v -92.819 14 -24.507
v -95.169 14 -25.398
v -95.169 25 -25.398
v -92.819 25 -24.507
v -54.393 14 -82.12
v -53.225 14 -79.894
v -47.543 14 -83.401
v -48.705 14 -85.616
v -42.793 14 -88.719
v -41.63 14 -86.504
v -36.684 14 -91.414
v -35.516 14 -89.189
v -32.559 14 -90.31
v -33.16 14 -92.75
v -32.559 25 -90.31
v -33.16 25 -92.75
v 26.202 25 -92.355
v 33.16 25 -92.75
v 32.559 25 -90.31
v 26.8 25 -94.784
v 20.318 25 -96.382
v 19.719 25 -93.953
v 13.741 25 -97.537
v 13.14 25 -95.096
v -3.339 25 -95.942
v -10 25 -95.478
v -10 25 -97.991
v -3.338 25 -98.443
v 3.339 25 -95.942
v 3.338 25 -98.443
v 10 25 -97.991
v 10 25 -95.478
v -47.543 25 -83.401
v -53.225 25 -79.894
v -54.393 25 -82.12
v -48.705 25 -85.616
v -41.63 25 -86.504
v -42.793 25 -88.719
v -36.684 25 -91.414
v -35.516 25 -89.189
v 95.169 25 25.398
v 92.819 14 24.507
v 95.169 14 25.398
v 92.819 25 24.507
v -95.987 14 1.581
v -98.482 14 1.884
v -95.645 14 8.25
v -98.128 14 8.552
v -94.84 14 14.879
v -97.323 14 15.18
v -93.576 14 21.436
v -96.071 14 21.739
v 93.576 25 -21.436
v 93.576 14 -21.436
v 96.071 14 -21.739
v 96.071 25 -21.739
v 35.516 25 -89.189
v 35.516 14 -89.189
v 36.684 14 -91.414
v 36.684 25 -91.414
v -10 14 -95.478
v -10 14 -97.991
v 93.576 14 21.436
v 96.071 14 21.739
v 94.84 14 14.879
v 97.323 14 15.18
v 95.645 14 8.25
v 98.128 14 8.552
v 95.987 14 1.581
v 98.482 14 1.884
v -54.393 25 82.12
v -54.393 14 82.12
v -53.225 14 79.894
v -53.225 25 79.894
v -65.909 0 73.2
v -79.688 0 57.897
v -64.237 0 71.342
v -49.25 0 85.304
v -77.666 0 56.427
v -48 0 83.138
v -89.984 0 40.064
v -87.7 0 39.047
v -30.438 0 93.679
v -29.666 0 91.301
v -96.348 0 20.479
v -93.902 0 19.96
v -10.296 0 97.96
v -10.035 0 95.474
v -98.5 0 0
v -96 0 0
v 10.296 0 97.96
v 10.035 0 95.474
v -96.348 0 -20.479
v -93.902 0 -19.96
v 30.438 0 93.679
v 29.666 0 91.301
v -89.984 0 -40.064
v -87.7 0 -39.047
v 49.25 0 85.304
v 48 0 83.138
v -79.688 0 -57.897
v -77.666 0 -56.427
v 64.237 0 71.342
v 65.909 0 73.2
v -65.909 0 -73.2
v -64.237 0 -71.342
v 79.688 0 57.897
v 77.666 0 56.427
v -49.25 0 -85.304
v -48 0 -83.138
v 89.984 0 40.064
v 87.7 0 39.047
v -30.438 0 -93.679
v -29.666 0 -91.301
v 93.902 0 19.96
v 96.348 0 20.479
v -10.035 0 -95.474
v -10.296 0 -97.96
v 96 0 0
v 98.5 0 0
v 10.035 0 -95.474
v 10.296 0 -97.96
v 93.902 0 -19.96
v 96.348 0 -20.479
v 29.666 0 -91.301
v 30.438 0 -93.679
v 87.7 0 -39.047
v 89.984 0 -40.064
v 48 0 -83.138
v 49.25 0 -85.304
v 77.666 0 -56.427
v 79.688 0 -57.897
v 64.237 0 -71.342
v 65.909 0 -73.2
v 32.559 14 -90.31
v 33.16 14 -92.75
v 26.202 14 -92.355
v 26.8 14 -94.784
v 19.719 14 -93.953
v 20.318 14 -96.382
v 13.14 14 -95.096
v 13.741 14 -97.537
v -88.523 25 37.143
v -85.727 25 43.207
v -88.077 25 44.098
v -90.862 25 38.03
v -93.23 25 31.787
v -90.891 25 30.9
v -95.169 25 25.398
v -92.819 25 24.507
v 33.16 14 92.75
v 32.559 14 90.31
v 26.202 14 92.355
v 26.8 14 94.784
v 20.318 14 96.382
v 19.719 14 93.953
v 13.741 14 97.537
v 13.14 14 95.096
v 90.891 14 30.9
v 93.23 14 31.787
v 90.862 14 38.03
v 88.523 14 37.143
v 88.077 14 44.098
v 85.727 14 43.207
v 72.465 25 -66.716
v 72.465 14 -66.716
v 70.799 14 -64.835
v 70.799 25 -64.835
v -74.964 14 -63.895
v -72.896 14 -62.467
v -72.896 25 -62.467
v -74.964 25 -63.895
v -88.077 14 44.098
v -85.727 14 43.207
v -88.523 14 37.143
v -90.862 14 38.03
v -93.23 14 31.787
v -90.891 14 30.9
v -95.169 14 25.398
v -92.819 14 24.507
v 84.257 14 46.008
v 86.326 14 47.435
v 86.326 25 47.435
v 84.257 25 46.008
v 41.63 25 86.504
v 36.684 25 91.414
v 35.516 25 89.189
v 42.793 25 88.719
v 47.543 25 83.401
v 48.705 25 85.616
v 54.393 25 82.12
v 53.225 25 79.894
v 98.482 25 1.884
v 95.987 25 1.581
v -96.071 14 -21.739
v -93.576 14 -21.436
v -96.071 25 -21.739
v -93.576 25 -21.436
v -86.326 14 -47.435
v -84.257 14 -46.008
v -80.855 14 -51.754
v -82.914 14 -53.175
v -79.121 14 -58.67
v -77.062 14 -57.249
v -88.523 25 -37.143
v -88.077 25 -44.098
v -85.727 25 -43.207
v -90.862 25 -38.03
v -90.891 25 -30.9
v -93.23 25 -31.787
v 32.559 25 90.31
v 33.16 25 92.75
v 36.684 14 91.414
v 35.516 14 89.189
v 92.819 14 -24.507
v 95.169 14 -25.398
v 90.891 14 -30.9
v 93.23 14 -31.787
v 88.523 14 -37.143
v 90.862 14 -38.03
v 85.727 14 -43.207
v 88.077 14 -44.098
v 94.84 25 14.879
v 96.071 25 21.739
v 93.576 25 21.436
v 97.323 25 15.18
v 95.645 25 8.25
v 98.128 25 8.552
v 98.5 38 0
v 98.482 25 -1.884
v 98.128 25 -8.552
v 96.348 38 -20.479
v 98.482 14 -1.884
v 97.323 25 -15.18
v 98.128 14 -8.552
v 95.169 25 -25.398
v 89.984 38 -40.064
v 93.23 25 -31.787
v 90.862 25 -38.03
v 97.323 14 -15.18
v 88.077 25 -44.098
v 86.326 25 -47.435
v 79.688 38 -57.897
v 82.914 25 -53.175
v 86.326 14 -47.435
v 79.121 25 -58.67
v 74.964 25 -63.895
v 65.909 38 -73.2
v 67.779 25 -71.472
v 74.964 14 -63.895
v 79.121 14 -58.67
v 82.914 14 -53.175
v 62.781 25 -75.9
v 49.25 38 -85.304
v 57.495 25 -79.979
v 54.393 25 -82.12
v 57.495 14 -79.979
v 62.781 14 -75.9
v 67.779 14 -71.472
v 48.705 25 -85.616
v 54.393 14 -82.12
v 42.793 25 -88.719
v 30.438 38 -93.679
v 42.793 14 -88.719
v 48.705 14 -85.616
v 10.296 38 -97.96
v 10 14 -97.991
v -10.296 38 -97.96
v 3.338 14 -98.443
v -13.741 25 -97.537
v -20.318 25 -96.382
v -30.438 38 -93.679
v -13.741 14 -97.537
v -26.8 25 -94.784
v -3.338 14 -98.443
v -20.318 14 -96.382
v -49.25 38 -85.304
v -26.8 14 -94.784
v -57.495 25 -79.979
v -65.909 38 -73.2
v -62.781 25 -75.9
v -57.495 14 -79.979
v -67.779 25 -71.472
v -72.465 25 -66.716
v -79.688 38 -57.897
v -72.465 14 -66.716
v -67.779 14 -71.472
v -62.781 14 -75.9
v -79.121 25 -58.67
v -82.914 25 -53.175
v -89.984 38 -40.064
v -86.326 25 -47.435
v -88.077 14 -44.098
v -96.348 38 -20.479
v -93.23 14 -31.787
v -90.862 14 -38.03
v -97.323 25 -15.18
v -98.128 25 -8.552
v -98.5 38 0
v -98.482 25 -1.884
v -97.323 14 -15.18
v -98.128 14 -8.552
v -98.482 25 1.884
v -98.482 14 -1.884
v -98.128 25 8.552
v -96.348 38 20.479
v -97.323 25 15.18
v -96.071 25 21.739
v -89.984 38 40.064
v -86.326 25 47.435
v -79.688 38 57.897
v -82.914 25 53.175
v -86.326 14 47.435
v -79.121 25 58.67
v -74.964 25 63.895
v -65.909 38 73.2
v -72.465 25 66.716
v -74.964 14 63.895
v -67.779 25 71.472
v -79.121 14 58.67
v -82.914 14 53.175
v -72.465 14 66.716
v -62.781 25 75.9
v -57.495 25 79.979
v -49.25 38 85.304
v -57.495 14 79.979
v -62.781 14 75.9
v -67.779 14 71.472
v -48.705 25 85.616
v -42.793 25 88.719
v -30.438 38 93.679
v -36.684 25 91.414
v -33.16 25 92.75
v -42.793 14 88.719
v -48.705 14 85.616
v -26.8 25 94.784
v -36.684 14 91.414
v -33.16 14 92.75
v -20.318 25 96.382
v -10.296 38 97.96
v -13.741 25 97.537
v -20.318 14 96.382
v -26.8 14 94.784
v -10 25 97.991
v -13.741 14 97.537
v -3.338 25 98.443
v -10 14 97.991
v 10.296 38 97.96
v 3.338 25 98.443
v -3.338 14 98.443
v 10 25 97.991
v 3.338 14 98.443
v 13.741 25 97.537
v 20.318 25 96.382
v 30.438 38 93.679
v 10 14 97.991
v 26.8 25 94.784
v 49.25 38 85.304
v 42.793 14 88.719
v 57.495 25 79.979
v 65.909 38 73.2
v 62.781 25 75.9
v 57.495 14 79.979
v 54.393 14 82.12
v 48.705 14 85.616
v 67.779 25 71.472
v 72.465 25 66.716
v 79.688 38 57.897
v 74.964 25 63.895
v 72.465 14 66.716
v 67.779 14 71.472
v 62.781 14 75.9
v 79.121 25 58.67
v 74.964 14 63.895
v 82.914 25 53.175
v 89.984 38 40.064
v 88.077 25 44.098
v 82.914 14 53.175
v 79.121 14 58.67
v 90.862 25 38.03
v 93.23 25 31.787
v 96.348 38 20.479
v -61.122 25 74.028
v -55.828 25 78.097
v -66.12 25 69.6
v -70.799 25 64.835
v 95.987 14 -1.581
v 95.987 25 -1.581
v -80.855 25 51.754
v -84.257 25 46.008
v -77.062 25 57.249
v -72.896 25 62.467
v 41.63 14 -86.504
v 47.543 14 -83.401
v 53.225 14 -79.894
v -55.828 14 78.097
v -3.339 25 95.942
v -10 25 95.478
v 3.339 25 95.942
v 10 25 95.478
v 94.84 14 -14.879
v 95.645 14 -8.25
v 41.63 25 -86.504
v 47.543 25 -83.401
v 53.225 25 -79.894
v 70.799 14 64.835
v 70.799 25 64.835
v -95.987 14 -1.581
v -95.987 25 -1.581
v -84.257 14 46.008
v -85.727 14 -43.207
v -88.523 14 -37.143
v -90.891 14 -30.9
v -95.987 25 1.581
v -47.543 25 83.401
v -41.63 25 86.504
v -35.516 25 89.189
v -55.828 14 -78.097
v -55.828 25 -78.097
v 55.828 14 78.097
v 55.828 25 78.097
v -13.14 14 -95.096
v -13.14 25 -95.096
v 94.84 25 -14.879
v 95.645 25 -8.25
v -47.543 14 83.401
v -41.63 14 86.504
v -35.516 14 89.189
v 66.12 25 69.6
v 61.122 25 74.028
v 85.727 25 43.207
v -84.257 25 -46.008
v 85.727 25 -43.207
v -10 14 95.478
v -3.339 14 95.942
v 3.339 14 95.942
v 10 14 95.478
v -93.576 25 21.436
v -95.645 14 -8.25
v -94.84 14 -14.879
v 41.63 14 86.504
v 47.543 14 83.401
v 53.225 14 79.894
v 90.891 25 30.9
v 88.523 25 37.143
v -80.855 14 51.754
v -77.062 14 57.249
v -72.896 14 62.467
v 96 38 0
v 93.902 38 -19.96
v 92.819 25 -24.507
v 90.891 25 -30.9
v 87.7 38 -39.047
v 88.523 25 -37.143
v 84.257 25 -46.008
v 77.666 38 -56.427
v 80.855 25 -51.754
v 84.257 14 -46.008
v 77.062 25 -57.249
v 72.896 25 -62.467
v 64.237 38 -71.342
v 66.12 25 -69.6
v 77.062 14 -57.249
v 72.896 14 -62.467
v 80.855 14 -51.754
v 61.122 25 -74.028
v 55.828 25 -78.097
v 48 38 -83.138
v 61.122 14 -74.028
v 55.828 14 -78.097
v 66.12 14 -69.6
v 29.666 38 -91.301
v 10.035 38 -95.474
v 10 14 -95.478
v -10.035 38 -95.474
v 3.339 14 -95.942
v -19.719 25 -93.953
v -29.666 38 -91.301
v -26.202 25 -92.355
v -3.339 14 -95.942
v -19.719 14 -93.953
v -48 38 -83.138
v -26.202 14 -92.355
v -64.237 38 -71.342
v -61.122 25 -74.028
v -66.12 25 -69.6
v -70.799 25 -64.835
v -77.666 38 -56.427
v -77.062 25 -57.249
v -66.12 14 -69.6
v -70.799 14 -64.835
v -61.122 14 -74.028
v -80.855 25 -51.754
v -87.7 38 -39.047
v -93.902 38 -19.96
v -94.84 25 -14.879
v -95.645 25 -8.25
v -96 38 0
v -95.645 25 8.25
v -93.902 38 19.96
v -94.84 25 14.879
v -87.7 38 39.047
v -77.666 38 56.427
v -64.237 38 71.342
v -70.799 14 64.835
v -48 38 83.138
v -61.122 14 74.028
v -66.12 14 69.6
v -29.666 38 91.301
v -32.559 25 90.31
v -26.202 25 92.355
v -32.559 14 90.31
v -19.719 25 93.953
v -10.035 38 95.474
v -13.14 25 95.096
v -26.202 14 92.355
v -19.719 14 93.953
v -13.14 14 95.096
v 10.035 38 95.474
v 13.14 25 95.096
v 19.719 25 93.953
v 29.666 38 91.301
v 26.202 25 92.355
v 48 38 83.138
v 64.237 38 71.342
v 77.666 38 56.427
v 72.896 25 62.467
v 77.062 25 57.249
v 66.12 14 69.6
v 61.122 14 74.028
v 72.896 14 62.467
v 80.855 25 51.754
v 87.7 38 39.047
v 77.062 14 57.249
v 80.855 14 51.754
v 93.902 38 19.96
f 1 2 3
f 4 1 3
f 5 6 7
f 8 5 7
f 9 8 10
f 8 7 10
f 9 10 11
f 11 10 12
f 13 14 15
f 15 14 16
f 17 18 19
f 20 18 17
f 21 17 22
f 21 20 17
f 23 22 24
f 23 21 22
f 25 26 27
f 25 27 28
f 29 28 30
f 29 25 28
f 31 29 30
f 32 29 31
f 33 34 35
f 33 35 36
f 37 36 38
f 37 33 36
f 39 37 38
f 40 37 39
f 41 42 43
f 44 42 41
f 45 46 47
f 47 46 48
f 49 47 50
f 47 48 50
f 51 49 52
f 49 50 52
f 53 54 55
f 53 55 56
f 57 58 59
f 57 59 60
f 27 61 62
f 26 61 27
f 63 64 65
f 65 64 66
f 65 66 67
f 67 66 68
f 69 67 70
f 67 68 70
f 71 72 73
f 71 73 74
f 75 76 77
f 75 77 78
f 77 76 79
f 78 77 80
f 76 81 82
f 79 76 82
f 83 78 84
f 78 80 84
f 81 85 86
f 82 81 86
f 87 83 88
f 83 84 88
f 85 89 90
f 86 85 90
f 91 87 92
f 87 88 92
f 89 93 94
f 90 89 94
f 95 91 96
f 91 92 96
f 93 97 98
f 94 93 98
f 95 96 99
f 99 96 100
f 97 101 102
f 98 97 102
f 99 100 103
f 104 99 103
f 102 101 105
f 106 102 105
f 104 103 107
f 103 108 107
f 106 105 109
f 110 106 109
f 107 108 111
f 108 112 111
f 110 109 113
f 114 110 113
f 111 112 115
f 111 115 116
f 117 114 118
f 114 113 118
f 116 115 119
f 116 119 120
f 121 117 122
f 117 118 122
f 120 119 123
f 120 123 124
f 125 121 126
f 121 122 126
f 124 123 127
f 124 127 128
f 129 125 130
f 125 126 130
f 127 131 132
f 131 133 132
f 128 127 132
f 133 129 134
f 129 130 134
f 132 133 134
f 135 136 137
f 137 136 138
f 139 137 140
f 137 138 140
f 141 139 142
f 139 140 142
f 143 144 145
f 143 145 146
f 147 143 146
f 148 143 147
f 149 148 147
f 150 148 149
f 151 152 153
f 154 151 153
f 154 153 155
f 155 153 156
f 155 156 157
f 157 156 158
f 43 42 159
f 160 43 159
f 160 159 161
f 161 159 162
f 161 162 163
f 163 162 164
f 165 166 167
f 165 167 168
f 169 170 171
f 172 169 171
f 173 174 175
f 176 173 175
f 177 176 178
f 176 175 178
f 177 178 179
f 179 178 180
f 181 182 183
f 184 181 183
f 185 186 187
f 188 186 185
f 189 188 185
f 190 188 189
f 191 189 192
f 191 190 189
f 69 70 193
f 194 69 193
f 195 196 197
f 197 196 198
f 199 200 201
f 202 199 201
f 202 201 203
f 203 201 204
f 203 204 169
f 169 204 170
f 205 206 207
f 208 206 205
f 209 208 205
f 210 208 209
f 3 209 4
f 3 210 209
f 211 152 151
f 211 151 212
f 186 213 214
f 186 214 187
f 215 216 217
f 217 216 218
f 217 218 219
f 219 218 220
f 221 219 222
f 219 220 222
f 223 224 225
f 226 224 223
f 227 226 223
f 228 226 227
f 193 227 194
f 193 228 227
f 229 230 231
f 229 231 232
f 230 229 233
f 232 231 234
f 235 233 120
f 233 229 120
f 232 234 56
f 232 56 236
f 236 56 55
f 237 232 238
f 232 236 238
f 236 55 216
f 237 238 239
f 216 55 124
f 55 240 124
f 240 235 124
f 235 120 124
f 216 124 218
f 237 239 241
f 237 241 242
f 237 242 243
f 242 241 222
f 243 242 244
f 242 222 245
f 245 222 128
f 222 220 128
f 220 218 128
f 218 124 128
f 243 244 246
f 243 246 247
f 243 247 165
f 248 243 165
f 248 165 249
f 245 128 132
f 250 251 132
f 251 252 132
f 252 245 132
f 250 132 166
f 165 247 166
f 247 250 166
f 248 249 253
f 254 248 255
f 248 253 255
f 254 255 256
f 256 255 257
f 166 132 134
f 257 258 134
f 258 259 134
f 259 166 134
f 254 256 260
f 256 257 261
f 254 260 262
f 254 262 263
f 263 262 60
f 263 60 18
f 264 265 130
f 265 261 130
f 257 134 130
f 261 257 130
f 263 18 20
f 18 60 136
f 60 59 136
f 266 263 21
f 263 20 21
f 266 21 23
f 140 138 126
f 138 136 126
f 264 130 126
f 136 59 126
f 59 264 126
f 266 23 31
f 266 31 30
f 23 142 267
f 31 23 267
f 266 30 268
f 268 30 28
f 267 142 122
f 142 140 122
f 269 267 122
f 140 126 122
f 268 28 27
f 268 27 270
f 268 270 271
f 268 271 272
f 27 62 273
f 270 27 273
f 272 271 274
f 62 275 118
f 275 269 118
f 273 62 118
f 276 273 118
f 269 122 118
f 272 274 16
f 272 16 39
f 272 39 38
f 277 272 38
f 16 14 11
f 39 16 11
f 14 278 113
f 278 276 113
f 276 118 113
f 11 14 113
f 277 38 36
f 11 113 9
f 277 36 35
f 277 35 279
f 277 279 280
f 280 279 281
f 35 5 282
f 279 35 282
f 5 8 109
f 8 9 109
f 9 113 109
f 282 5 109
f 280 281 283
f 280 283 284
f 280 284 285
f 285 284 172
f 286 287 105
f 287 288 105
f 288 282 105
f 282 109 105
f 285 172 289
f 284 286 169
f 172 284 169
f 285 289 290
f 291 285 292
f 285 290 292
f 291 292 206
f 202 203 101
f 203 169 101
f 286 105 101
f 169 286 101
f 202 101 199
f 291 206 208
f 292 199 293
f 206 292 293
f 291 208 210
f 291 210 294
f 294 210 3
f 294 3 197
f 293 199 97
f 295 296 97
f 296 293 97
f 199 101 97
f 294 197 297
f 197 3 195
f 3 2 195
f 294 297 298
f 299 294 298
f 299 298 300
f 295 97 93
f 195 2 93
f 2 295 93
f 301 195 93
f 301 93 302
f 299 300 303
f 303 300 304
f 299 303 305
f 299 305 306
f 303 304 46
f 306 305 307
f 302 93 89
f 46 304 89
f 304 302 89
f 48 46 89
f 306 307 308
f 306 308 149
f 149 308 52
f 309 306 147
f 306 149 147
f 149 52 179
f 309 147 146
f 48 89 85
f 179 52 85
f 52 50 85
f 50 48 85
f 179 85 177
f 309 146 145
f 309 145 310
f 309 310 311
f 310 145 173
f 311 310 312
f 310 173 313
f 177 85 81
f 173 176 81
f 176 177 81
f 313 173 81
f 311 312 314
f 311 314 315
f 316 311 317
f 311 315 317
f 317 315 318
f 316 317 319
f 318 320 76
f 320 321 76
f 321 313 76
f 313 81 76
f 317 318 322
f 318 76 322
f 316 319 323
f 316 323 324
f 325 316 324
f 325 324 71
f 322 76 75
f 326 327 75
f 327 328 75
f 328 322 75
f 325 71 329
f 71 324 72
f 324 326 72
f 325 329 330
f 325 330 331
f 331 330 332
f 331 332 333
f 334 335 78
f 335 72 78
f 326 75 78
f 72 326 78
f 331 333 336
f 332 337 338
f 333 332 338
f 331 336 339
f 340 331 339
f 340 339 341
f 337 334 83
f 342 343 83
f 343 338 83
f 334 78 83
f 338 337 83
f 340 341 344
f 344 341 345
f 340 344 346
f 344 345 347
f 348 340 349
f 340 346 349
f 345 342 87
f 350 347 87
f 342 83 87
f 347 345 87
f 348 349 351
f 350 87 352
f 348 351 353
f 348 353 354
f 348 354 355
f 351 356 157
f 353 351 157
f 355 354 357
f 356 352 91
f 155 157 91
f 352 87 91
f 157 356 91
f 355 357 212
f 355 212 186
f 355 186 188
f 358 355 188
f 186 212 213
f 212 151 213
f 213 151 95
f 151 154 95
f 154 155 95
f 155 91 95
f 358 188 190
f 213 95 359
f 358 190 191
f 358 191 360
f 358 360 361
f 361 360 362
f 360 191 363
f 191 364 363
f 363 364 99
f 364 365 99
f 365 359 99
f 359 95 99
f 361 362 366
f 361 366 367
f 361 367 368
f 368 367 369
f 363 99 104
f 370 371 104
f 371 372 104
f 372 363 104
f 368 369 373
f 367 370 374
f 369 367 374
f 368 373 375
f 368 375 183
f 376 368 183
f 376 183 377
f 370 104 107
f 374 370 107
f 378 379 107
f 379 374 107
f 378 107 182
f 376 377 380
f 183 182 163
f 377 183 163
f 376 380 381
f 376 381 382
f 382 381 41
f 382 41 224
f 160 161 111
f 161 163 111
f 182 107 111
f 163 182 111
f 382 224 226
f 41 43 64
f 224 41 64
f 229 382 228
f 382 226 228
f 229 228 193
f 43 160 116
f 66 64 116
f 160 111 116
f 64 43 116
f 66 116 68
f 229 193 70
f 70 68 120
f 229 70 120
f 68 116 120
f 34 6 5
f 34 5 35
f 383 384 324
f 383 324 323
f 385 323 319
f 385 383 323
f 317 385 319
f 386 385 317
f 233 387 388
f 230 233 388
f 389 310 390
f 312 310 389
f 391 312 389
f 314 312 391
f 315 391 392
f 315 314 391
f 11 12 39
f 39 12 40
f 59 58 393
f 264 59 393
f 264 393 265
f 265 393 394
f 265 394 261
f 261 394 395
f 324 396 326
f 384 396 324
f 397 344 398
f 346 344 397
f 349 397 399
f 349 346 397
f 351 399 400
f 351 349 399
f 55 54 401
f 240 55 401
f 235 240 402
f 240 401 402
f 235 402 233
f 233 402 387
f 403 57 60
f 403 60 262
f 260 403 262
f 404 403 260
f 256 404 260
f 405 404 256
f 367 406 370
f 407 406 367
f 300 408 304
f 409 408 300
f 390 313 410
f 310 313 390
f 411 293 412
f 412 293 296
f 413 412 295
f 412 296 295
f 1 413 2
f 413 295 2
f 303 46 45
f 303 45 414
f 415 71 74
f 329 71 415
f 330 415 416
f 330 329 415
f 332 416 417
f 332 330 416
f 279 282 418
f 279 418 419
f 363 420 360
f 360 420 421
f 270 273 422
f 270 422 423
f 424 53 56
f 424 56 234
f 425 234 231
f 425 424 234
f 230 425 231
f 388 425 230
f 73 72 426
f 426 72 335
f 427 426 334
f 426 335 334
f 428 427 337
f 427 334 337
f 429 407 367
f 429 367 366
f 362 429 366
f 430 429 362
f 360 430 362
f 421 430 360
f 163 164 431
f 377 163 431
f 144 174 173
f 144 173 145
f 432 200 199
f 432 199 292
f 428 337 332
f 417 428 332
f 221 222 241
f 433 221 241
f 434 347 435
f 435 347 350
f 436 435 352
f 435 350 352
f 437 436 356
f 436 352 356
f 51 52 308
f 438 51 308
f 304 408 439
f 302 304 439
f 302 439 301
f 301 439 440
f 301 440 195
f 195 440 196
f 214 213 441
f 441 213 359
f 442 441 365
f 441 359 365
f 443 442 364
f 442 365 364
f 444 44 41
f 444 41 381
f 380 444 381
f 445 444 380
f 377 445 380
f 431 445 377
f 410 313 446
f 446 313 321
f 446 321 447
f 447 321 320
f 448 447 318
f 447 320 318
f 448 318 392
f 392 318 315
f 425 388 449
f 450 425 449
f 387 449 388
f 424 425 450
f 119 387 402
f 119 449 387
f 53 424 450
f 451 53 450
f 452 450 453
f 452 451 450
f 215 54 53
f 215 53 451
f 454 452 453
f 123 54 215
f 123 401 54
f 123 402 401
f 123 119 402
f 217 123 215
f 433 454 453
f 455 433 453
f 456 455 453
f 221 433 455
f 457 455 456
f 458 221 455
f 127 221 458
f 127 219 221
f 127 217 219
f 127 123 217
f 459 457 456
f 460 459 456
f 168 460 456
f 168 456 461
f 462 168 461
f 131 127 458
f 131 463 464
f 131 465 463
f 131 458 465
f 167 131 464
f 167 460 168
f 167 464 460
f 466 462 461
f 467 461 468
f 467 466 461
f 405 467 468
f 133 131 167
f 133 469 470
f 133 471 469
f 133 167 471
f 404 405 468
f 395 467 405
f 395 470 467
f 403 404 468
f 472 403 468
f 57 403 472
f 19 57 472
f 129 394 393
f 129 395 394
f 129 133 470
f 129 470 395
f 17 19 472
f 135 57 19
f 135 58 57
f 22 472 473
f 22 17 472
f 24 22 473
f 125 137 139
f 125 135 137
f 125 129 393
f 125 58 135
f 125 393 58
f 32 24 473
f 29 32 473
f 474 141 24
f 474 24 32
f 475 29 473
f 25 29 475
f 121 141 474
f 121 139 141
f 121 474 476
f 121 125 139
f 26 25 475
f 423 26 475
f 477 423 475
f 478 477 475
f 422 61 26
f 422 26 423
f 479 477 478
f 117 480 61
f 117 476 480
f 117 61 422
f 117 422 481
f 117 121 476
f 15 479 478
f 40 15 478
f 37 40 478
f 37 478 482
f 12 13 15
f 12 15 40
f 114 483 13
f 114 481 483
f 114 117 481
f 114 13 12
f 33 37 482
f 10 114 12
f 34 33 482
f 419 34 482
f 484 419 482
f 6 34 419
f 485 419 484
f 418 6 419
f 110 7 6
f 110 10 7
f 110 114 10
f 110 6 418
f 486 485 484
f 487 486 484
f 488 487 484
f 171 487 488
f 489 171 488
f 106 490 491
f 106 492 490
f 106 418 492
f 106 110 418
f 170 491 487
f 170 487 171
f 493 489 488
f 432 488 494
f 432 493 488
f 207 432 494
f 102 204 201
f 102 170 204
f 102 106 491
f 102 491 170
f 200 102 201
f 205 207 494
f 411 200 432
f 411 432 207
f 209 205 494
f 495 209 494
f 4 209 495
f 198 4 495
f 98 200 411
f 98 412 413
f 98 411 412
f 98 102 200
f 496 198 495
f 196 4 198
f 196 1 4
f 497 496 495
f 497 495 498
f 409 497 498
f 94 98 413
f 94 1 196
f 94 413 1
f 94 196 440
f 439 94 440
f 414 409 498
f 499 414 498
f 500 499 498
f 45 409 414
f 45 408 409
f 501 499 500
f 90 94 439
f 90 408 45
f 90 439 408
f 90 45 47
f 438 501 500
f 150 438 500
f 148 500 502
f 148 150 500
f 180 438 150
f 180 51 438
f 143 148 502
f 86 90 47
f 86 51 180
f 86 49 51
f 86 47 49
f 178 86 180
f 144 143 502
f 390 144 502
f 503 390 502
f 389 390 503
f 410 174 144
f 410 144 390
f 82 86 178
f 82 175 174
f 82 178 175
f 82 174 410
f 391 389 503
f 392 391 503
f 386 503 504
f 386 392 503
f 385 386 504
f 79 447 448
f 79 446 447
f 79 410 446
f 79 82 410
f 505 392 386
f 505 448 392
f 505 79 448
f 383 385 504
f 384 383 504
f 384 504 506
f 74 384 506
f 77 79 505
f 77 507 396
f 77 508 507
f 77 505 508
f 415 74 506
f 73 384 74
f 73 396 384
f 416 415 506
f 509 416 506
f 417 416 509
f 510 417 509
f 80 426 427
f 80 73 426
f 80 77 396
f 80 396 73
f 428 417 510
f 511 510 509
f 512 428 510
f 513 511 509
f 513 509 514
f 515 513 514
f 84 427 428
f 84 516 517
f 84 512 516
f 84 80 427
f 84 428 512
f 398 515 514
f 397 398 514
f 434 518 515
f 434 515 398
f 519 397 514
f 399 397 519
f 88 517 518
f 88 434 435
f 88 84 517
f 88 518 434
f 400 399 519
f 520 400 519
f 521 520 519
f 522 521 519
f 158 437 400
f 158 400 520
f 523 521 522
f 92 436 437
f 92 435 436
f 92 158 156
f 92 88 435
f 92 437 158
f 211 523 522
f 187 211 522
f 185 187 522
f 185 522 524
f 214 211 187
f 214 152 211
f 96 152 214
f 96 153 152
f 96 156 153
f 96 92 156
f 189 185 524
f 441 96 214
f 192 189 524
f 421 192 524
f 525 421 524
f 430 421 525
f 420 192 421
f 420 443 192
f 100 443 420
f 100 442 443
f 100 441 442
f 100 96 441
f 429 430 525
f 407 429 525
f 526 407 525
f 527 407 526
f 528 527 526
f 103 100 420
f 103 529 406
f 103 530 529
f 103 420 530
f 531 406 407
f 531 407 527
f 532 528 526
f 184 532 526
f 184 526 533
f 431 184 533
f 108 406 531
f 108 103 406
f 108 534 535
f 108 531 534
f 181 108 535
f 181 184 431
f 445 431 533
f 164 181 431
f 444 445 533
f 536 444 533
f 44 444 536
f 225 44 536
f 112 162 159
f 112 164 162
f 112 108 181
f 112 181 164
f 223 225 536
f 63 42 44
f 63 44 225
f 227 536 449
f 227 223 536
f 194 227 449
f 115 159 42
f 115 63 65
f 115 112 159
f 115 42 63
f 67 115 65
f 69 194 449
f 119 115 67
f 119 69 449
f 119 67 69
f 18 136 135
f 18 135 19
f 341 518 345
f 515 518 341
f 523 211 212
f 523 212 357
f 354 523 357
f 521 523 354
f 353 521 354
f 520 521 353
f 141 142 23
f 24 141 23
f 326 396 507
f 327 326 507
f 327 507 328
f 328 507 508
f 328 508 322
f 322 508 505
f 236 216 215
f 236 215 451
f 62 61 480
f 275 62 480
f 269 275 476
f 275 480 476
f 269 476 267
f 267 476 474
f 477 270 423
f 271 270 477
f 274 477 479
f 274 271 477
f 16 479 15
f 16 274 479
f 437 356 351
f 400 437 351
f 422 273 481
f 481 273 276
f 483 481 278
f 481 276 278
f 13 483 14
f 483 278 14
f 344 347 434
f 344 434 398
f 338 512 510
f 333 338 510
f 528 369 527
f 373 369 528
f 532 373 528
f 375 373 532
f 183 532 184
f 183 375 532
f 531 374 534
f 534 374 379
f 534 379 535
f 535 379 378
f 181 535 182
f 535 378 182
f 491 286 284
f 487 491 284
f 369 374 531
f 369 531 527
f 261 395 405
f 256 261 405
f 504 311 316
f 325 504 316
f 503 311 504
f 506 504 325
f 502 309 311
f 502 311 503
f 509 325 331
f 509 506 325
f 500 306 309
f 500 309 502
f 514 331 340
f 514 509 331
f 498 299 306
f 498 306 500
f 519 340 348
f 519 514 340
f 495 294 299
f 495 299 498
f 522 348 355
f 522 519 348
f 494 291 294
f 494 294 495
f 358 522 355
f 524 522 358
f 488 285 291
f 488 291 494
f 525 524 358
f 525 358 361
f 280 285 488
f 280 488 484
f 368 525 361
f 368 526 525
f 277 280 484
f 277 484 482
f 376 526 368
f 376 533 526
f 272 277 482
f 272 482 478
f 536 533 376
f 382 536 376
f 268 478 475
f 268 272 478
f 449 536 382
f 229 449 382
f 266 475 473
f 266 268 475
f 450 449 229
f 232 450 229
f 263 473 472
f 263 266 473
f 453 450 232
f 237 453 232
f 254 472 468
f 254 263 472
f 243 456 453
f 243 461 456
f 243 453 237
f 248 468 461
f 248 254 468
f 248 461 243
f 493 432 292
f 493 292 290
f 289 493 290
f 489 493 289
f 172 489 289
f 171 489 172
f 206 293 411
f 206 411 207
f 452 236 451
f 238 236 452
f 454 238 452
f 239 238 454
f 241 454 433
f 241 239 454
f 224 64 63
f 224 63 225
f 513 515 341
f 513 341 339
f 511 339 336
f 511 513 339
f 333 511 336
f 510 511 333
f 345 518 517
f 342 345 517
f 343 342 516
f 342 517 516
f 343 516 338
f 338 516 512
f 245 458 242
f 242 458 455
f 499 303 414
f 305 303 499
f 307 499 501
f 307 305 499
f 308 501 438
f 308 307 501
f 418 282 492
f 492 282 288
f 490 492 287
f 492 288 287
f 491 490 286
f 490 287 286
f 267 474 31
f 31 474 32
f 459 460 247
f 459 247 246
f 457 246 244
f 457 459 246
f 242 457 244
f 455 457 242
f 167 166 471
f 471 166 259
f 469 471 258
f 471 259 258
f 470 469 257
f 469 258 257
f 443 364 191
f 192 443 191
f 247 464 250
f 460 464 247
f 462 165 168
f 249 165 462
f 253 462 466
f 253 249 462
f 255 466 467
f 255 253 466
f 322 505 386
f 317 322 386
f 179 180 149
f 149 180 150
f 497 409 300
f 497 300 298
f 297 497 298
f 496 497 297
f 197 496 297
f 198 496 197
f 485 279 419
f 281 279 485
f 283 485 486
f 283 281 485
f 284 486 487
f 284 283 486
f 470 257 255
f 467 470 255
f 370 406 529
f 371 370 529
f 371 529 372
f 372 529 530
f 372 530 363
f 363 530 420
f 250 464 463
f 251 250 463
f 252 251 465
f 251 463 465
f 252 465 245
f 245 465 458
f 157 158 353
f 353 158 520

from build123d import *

# Parameters (mm, degrees)
SKETCH1_R           = 98.5
SKETCH1_R_2         = 96
BOSS_EXTRUDE1_DEPTH = 38
SKETCH2_W           = 20
SKETCH2_H           = 11
CUT_EXTRUDE1_DEPTH  = 99.5
CIRPATTERN1_COUNT   = 13


with BuildPart() as part:
    # Sketch1 → Boss-Extrude1 (new body)
    with BuildSketch(Plane(origin=(0, 0, 0), x_dir=(1, 0, 0), z_dir=(0, 1, 0))):
        Circle(SKETCH1_R)
        Circle(SKETCH1_R_2, mode=Mode.SUBTRACT)
    extrude(amount=BOSS_EXTRUDE1_DEPTH)

    # Sketch2 → Cut-Extrude1 (cut, symmetric)
    with BuildSketch(Plane.XY):
        with Locations((0, 19.5)):
            Rectangle(SKETCH2_W, SKETCH2_H)
    cut_extrude1 = extrude(amount=CUT_EXTRUDE1_DEPTH, both=True, mode=Mode.SUBTRACT)

    # CirPattern1: Cut-Extrude1 ×13 about axis
    cirpattern1_axis = Axis((0, 0, 0), (0, 1, 0))
    for i in range(1, CIRPATTERN1_COUNT):
        add(cut_extrude1.rotate(cirpattern1_axis, i * 360 / CIRPATTERN1_COUNT), mode=Mode.SUBTRACT)


solid = part.part
